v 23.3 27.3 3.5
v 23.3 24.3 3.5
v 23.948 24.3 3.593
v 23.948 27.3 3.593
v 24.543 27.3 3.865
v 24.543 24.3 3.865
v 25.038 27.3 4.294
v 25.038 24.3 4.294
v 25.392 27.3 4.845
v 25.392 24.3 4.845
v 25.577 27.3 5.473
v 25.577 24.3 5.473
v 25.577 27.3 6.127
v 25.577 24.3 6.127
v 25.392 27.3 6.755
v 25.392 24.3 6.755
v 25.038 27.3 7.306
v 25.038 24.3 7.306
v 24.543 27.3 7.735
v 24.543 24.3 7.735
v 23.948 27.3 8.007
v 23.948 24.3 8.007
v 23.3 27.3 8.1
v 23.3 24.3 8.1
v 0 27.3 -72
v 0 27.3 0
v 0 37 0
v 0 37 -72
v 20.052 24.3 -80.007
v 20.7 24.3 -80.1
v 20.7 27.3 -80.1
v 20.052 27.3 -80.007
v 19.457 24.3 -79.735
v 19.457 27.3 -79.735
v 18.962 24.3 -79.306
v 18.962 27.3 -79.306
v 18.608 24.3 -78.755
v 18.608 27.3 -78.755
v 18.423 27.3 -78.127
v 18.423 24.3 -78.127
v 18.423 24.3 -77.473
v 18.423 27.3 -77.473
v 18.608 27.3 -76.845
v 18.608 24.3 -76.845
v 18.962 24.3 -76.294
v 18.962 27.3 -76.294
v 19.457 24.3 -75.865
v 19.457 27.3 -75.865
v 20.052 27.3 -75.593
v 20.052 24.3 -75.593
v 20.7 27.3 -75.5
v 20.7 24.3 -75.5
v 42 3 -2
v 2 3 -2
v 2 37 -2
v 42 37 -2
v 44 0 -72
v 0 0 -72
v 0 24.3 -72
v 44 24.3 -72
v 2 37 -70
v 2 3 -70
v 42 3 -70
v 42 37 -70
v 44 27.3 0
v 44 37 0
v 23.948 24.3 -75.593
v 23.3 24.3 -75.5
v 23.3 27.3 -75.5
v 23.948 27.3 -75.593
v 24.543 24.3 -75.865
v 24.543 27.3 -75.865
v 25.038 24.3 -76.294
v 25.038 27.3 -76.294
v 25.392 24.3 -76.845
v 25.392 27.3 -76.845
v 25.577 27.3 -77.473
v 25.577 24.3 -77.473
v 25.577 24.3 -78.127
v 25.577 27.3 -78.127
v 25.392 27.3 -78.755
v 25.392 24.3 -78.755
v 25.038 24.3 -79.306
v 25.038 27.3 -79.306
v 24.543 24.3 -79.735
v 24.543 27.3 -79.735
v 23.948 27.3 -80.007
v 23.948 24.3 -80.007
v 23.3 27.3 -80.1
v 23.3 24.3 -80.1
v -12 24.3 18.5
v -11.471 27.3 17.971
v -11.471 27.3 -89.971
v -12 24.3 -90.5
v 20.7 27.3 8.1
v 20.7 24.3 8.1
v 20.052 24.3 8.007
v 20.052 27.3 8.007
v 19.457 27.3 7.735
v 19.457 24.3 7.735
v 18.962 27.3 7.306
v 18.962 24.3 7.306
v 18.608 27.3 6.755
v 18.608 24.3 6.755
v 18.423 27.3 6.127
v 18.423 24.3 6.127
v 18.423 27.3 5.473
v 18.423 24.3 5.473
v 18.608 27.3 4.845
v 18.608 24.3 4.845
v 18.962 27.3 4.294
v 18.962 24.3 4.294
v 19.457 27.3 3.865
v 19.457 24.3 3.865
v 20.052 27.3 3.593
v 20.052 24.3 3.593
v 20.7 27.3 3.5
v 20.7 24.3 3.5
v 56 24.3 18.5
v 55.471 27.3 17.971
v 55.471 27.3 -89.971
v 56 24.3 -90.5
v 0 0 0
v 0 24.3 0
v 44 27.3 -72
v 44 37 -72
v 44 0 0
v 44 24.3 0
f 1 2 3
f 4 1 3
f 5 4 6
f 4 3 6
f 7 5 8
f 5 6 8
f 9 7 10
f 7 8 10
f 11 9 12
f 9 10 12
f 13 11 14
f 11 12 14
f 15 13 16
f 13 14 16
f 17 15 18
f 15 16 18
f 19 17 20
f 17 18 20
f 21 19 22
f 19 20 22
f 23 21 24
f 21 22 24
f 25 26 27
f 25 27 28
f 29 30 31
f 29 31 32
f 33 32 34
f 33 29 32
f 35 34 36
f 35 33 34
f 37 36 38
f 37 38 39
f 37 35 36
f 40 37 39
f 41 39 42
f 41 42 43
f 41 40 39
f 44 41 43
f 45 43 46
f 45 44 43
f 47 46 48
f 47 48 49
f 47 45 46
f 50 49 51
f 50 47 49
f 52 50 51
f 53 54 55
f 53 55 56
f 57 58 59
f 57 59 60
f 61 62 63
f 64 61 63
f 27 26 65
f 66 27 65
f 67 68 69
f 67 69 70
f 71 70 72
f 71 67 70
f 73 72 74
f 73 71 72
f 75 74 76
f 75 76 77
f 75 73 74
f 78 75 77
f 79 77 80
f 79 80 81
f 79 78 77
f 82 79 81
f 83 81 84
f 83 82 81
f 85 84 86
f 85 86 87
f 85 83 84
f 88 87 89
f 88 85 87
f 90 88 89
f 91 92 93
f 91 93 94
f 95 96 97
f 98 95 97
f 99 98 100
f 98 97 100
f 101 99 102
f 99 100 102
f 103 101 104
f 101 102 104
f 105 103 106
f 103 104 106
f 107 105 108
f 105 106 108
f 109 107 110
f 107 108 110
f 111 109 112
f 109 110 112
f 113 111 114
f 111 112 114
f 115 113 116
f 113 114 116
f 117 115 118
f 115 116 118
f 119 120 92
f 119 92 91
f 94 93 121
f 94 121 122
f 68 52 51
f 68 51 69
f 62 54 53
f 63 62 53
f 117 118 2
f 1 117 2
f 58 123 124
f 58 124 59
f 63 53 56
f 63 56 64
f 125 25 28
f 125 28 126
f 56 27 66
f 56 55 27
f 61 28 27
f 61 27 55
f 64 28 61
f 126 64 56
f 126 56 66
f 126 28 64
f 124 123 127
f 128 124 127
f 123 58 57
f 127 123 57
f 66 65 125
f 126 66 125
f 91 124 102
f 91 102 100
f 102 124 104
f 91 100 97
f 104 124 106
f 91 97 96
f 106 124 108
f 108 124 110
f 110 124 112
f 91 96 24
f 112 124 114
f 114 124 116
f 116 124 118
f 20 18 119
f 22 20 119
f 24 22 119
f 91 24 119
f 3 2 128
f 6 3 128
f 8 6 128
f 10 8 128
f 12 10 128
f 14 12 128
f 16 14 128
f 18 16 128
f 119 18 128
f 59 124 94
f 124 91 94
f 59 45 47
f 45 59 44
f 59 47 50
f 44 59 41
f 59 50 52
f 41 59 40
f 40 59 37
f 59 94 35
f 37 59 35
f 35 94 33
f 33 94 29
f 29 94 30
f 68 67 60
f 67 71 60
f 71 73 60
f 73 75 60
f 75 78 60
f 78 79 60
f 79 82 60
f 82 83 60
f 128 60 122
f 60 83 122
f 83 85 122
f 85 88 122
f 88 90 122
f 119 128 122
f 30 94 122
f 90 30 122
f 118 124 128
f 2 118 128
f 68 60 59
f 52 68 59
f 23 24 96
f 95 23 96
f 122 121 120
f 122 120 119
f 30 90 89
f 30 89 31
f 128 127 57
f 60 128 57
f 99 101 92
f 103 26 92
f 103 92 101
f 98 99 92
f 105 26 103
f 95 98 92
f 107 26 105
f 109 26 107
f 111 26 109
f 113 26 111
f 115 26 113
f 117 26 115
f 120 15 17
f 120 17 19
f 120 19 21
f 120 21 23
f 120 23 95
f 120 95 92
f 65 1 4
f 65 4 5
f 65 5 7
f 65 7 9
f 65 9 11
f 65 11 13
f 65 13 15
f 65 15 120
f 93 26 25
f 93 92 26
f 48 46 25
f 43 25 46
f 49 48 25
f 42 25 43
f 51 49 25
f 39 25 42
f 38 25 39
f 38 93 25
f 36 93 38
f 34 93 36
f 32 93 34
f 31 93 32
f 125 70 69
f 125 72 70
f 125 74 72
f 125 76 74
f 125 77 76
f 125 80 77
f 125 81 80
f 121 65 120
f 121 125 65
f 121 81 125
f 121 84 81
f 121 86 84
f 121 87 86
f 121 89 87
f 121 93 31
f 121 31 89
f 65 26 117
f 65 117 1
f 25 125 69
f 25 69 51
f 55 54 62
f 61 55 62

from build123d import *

# Parameters (mm, degrees)
SKETCH1_W           = 44
SKETCH1_H           = 72
BOSS_EXTRUDE1_DEPTH = 3
SKETCH2_W           = 44
SKETCH2_H           = 72
SKETCH2_W_2         = 40
SKETCH2_H_2         = 68
BOSS_EXTRUDE2_DEPTH = 34
SKETCH3_W           = 68
SKETCH3_H           = 109
SKETCH3_W_2         = 44
SKETCH3_H_2         = 72
BOSS_EXTRUDE3_DEPTH = 3
CHAMFER1_SIZE       = 0.528980942
CHAMFER1_SIZE_2     = 3


with BuildPart() as part:
    # Sketch1 → Boss-Extrude1 (new body)
    with BuildSketch(Plane(origin=(0, 0, 0), x_dir=(1, 0, 0), z_dir=(0, 1, 0))):
        with Locations((22, 36)):
            Rectangle(SKETCH1_W, SKETCH1_H)
    extrude(amount=BOSS_EXTRUDE1_DEPTH)

    # Sketch2 → Boss-Extrude2 (add)
    with BuildSketch(Plane(origin=(0, 3, 0), x_dir=(1, 0, 0), z_dir=(0, 1, 0))):
        with Locations((22, 36)):
            Rectangle(SKETCH2_W, SKETCH2_H)
        with Locations((22, 36)):
            Rectangle(SKETCH2_W_2, SKETCH2_H_2, mode=Mode.SUBTRACT)
    extrude(amount=BOSS_EXTRUDE2_DEPTH)

    # Sketch3 → Boss-Extrude3 (add)
    with BuildSketch(Plane(origin=(0, 24.3, 0), x_dir=(1, 0, 0), z_dir=(0, 1, 0))):
        with Locations((22, 36)):
            Rectangle(SKETCH3_W, SKETCH3_H)
        with Locations((22, 36)):
            Rectangle(SKETCH3_W_2, SKETCH3_H_2, mode=Mode.SUBTRACT)
        with BuildLine():
            Line((20.7, -3.5), (23.3, -3.5))
            ThreePointArc((23.3, -3.5), (25.6, -5.8), (23.3, -8.1))
            Line((23.3, -8.1), (20.7, -8.1))
            ThreePointArc((20.7, -8.1), (18.4, -5.8), (20.7, -3.5))
        make_face(mode=Mode.SUBTRACT)
        with BuildLine():
            Line((20.7, 75.5), (23.3, 75.5))
            ThreePointArc((23.3, 75.5), (25.6, 77.8), (23.3, 80.1))
            Line((23.3, 80.1), (20.7, 80.1))
            ThreePointArc((20.7, 80.1), (18.4, 77.8), (20.7, 75.5))
        make_face(mode=Mode.SUBTRACT)
    extrude(amount=BOSS_EXTRUDE3_DEPTH)

    # Chamfer1
    # the kernel refuses this chamfer: 3, 0.528980942 mm, written as the material it takes off along each edge
    with BuildSketch(Plane(origin=(-19.795616389, 27.3, -90.5), x_dir=(0, 0.21013876076743068, 0.9776715712462589), z_dir=(1, 0, 0)), Plane(origin=(63.795616389, 27.3, 18.5), x_dir=(0, 0.21013876076743068, -0.9776715712462589), z_dir=(-1, 0, 0))) as chamfer1_piece_1:
        Polygon((CHAMFER1_SIZE * 0.977671571478, CHAMFER1_SIZE * 0.210138760817), (-CHAMFER1_SIZE_2 * 0.210138760767, CHAMFER1_SIZE_2 * 0.977671571246), (0, 0), align=None)
    extrude(amount=83.591232779, mode=Mode.SUBTRACT)
    with BuildSketch(Plane(origin=(-12, 27.3, 26.295616389), x_dir=(0.9776715712462593, 0.21013876076742874, 0), z_dir=(0, 0, -1)), Plane(origin=(56, 27.3, -98.295616389), x_dir=(-0.9776715712462594, 0.21013876076742807, 0), z_dir=(0, 0, 1))) as chamfer1_piece_2:
        Polygon((CHAMFER1_SIZE * 0.977671571478, CHAMFER1_SIZE * 0.210138760817), (-CHAMFER1_SIZE_2 * 0.210138760767, CHAMFER1_SIZE_2 * 0.977671571246), (0, 0), align=None)
    extrude(amount=124.591232779, mode=Mode.SUBTRACT)


solid = part.part
